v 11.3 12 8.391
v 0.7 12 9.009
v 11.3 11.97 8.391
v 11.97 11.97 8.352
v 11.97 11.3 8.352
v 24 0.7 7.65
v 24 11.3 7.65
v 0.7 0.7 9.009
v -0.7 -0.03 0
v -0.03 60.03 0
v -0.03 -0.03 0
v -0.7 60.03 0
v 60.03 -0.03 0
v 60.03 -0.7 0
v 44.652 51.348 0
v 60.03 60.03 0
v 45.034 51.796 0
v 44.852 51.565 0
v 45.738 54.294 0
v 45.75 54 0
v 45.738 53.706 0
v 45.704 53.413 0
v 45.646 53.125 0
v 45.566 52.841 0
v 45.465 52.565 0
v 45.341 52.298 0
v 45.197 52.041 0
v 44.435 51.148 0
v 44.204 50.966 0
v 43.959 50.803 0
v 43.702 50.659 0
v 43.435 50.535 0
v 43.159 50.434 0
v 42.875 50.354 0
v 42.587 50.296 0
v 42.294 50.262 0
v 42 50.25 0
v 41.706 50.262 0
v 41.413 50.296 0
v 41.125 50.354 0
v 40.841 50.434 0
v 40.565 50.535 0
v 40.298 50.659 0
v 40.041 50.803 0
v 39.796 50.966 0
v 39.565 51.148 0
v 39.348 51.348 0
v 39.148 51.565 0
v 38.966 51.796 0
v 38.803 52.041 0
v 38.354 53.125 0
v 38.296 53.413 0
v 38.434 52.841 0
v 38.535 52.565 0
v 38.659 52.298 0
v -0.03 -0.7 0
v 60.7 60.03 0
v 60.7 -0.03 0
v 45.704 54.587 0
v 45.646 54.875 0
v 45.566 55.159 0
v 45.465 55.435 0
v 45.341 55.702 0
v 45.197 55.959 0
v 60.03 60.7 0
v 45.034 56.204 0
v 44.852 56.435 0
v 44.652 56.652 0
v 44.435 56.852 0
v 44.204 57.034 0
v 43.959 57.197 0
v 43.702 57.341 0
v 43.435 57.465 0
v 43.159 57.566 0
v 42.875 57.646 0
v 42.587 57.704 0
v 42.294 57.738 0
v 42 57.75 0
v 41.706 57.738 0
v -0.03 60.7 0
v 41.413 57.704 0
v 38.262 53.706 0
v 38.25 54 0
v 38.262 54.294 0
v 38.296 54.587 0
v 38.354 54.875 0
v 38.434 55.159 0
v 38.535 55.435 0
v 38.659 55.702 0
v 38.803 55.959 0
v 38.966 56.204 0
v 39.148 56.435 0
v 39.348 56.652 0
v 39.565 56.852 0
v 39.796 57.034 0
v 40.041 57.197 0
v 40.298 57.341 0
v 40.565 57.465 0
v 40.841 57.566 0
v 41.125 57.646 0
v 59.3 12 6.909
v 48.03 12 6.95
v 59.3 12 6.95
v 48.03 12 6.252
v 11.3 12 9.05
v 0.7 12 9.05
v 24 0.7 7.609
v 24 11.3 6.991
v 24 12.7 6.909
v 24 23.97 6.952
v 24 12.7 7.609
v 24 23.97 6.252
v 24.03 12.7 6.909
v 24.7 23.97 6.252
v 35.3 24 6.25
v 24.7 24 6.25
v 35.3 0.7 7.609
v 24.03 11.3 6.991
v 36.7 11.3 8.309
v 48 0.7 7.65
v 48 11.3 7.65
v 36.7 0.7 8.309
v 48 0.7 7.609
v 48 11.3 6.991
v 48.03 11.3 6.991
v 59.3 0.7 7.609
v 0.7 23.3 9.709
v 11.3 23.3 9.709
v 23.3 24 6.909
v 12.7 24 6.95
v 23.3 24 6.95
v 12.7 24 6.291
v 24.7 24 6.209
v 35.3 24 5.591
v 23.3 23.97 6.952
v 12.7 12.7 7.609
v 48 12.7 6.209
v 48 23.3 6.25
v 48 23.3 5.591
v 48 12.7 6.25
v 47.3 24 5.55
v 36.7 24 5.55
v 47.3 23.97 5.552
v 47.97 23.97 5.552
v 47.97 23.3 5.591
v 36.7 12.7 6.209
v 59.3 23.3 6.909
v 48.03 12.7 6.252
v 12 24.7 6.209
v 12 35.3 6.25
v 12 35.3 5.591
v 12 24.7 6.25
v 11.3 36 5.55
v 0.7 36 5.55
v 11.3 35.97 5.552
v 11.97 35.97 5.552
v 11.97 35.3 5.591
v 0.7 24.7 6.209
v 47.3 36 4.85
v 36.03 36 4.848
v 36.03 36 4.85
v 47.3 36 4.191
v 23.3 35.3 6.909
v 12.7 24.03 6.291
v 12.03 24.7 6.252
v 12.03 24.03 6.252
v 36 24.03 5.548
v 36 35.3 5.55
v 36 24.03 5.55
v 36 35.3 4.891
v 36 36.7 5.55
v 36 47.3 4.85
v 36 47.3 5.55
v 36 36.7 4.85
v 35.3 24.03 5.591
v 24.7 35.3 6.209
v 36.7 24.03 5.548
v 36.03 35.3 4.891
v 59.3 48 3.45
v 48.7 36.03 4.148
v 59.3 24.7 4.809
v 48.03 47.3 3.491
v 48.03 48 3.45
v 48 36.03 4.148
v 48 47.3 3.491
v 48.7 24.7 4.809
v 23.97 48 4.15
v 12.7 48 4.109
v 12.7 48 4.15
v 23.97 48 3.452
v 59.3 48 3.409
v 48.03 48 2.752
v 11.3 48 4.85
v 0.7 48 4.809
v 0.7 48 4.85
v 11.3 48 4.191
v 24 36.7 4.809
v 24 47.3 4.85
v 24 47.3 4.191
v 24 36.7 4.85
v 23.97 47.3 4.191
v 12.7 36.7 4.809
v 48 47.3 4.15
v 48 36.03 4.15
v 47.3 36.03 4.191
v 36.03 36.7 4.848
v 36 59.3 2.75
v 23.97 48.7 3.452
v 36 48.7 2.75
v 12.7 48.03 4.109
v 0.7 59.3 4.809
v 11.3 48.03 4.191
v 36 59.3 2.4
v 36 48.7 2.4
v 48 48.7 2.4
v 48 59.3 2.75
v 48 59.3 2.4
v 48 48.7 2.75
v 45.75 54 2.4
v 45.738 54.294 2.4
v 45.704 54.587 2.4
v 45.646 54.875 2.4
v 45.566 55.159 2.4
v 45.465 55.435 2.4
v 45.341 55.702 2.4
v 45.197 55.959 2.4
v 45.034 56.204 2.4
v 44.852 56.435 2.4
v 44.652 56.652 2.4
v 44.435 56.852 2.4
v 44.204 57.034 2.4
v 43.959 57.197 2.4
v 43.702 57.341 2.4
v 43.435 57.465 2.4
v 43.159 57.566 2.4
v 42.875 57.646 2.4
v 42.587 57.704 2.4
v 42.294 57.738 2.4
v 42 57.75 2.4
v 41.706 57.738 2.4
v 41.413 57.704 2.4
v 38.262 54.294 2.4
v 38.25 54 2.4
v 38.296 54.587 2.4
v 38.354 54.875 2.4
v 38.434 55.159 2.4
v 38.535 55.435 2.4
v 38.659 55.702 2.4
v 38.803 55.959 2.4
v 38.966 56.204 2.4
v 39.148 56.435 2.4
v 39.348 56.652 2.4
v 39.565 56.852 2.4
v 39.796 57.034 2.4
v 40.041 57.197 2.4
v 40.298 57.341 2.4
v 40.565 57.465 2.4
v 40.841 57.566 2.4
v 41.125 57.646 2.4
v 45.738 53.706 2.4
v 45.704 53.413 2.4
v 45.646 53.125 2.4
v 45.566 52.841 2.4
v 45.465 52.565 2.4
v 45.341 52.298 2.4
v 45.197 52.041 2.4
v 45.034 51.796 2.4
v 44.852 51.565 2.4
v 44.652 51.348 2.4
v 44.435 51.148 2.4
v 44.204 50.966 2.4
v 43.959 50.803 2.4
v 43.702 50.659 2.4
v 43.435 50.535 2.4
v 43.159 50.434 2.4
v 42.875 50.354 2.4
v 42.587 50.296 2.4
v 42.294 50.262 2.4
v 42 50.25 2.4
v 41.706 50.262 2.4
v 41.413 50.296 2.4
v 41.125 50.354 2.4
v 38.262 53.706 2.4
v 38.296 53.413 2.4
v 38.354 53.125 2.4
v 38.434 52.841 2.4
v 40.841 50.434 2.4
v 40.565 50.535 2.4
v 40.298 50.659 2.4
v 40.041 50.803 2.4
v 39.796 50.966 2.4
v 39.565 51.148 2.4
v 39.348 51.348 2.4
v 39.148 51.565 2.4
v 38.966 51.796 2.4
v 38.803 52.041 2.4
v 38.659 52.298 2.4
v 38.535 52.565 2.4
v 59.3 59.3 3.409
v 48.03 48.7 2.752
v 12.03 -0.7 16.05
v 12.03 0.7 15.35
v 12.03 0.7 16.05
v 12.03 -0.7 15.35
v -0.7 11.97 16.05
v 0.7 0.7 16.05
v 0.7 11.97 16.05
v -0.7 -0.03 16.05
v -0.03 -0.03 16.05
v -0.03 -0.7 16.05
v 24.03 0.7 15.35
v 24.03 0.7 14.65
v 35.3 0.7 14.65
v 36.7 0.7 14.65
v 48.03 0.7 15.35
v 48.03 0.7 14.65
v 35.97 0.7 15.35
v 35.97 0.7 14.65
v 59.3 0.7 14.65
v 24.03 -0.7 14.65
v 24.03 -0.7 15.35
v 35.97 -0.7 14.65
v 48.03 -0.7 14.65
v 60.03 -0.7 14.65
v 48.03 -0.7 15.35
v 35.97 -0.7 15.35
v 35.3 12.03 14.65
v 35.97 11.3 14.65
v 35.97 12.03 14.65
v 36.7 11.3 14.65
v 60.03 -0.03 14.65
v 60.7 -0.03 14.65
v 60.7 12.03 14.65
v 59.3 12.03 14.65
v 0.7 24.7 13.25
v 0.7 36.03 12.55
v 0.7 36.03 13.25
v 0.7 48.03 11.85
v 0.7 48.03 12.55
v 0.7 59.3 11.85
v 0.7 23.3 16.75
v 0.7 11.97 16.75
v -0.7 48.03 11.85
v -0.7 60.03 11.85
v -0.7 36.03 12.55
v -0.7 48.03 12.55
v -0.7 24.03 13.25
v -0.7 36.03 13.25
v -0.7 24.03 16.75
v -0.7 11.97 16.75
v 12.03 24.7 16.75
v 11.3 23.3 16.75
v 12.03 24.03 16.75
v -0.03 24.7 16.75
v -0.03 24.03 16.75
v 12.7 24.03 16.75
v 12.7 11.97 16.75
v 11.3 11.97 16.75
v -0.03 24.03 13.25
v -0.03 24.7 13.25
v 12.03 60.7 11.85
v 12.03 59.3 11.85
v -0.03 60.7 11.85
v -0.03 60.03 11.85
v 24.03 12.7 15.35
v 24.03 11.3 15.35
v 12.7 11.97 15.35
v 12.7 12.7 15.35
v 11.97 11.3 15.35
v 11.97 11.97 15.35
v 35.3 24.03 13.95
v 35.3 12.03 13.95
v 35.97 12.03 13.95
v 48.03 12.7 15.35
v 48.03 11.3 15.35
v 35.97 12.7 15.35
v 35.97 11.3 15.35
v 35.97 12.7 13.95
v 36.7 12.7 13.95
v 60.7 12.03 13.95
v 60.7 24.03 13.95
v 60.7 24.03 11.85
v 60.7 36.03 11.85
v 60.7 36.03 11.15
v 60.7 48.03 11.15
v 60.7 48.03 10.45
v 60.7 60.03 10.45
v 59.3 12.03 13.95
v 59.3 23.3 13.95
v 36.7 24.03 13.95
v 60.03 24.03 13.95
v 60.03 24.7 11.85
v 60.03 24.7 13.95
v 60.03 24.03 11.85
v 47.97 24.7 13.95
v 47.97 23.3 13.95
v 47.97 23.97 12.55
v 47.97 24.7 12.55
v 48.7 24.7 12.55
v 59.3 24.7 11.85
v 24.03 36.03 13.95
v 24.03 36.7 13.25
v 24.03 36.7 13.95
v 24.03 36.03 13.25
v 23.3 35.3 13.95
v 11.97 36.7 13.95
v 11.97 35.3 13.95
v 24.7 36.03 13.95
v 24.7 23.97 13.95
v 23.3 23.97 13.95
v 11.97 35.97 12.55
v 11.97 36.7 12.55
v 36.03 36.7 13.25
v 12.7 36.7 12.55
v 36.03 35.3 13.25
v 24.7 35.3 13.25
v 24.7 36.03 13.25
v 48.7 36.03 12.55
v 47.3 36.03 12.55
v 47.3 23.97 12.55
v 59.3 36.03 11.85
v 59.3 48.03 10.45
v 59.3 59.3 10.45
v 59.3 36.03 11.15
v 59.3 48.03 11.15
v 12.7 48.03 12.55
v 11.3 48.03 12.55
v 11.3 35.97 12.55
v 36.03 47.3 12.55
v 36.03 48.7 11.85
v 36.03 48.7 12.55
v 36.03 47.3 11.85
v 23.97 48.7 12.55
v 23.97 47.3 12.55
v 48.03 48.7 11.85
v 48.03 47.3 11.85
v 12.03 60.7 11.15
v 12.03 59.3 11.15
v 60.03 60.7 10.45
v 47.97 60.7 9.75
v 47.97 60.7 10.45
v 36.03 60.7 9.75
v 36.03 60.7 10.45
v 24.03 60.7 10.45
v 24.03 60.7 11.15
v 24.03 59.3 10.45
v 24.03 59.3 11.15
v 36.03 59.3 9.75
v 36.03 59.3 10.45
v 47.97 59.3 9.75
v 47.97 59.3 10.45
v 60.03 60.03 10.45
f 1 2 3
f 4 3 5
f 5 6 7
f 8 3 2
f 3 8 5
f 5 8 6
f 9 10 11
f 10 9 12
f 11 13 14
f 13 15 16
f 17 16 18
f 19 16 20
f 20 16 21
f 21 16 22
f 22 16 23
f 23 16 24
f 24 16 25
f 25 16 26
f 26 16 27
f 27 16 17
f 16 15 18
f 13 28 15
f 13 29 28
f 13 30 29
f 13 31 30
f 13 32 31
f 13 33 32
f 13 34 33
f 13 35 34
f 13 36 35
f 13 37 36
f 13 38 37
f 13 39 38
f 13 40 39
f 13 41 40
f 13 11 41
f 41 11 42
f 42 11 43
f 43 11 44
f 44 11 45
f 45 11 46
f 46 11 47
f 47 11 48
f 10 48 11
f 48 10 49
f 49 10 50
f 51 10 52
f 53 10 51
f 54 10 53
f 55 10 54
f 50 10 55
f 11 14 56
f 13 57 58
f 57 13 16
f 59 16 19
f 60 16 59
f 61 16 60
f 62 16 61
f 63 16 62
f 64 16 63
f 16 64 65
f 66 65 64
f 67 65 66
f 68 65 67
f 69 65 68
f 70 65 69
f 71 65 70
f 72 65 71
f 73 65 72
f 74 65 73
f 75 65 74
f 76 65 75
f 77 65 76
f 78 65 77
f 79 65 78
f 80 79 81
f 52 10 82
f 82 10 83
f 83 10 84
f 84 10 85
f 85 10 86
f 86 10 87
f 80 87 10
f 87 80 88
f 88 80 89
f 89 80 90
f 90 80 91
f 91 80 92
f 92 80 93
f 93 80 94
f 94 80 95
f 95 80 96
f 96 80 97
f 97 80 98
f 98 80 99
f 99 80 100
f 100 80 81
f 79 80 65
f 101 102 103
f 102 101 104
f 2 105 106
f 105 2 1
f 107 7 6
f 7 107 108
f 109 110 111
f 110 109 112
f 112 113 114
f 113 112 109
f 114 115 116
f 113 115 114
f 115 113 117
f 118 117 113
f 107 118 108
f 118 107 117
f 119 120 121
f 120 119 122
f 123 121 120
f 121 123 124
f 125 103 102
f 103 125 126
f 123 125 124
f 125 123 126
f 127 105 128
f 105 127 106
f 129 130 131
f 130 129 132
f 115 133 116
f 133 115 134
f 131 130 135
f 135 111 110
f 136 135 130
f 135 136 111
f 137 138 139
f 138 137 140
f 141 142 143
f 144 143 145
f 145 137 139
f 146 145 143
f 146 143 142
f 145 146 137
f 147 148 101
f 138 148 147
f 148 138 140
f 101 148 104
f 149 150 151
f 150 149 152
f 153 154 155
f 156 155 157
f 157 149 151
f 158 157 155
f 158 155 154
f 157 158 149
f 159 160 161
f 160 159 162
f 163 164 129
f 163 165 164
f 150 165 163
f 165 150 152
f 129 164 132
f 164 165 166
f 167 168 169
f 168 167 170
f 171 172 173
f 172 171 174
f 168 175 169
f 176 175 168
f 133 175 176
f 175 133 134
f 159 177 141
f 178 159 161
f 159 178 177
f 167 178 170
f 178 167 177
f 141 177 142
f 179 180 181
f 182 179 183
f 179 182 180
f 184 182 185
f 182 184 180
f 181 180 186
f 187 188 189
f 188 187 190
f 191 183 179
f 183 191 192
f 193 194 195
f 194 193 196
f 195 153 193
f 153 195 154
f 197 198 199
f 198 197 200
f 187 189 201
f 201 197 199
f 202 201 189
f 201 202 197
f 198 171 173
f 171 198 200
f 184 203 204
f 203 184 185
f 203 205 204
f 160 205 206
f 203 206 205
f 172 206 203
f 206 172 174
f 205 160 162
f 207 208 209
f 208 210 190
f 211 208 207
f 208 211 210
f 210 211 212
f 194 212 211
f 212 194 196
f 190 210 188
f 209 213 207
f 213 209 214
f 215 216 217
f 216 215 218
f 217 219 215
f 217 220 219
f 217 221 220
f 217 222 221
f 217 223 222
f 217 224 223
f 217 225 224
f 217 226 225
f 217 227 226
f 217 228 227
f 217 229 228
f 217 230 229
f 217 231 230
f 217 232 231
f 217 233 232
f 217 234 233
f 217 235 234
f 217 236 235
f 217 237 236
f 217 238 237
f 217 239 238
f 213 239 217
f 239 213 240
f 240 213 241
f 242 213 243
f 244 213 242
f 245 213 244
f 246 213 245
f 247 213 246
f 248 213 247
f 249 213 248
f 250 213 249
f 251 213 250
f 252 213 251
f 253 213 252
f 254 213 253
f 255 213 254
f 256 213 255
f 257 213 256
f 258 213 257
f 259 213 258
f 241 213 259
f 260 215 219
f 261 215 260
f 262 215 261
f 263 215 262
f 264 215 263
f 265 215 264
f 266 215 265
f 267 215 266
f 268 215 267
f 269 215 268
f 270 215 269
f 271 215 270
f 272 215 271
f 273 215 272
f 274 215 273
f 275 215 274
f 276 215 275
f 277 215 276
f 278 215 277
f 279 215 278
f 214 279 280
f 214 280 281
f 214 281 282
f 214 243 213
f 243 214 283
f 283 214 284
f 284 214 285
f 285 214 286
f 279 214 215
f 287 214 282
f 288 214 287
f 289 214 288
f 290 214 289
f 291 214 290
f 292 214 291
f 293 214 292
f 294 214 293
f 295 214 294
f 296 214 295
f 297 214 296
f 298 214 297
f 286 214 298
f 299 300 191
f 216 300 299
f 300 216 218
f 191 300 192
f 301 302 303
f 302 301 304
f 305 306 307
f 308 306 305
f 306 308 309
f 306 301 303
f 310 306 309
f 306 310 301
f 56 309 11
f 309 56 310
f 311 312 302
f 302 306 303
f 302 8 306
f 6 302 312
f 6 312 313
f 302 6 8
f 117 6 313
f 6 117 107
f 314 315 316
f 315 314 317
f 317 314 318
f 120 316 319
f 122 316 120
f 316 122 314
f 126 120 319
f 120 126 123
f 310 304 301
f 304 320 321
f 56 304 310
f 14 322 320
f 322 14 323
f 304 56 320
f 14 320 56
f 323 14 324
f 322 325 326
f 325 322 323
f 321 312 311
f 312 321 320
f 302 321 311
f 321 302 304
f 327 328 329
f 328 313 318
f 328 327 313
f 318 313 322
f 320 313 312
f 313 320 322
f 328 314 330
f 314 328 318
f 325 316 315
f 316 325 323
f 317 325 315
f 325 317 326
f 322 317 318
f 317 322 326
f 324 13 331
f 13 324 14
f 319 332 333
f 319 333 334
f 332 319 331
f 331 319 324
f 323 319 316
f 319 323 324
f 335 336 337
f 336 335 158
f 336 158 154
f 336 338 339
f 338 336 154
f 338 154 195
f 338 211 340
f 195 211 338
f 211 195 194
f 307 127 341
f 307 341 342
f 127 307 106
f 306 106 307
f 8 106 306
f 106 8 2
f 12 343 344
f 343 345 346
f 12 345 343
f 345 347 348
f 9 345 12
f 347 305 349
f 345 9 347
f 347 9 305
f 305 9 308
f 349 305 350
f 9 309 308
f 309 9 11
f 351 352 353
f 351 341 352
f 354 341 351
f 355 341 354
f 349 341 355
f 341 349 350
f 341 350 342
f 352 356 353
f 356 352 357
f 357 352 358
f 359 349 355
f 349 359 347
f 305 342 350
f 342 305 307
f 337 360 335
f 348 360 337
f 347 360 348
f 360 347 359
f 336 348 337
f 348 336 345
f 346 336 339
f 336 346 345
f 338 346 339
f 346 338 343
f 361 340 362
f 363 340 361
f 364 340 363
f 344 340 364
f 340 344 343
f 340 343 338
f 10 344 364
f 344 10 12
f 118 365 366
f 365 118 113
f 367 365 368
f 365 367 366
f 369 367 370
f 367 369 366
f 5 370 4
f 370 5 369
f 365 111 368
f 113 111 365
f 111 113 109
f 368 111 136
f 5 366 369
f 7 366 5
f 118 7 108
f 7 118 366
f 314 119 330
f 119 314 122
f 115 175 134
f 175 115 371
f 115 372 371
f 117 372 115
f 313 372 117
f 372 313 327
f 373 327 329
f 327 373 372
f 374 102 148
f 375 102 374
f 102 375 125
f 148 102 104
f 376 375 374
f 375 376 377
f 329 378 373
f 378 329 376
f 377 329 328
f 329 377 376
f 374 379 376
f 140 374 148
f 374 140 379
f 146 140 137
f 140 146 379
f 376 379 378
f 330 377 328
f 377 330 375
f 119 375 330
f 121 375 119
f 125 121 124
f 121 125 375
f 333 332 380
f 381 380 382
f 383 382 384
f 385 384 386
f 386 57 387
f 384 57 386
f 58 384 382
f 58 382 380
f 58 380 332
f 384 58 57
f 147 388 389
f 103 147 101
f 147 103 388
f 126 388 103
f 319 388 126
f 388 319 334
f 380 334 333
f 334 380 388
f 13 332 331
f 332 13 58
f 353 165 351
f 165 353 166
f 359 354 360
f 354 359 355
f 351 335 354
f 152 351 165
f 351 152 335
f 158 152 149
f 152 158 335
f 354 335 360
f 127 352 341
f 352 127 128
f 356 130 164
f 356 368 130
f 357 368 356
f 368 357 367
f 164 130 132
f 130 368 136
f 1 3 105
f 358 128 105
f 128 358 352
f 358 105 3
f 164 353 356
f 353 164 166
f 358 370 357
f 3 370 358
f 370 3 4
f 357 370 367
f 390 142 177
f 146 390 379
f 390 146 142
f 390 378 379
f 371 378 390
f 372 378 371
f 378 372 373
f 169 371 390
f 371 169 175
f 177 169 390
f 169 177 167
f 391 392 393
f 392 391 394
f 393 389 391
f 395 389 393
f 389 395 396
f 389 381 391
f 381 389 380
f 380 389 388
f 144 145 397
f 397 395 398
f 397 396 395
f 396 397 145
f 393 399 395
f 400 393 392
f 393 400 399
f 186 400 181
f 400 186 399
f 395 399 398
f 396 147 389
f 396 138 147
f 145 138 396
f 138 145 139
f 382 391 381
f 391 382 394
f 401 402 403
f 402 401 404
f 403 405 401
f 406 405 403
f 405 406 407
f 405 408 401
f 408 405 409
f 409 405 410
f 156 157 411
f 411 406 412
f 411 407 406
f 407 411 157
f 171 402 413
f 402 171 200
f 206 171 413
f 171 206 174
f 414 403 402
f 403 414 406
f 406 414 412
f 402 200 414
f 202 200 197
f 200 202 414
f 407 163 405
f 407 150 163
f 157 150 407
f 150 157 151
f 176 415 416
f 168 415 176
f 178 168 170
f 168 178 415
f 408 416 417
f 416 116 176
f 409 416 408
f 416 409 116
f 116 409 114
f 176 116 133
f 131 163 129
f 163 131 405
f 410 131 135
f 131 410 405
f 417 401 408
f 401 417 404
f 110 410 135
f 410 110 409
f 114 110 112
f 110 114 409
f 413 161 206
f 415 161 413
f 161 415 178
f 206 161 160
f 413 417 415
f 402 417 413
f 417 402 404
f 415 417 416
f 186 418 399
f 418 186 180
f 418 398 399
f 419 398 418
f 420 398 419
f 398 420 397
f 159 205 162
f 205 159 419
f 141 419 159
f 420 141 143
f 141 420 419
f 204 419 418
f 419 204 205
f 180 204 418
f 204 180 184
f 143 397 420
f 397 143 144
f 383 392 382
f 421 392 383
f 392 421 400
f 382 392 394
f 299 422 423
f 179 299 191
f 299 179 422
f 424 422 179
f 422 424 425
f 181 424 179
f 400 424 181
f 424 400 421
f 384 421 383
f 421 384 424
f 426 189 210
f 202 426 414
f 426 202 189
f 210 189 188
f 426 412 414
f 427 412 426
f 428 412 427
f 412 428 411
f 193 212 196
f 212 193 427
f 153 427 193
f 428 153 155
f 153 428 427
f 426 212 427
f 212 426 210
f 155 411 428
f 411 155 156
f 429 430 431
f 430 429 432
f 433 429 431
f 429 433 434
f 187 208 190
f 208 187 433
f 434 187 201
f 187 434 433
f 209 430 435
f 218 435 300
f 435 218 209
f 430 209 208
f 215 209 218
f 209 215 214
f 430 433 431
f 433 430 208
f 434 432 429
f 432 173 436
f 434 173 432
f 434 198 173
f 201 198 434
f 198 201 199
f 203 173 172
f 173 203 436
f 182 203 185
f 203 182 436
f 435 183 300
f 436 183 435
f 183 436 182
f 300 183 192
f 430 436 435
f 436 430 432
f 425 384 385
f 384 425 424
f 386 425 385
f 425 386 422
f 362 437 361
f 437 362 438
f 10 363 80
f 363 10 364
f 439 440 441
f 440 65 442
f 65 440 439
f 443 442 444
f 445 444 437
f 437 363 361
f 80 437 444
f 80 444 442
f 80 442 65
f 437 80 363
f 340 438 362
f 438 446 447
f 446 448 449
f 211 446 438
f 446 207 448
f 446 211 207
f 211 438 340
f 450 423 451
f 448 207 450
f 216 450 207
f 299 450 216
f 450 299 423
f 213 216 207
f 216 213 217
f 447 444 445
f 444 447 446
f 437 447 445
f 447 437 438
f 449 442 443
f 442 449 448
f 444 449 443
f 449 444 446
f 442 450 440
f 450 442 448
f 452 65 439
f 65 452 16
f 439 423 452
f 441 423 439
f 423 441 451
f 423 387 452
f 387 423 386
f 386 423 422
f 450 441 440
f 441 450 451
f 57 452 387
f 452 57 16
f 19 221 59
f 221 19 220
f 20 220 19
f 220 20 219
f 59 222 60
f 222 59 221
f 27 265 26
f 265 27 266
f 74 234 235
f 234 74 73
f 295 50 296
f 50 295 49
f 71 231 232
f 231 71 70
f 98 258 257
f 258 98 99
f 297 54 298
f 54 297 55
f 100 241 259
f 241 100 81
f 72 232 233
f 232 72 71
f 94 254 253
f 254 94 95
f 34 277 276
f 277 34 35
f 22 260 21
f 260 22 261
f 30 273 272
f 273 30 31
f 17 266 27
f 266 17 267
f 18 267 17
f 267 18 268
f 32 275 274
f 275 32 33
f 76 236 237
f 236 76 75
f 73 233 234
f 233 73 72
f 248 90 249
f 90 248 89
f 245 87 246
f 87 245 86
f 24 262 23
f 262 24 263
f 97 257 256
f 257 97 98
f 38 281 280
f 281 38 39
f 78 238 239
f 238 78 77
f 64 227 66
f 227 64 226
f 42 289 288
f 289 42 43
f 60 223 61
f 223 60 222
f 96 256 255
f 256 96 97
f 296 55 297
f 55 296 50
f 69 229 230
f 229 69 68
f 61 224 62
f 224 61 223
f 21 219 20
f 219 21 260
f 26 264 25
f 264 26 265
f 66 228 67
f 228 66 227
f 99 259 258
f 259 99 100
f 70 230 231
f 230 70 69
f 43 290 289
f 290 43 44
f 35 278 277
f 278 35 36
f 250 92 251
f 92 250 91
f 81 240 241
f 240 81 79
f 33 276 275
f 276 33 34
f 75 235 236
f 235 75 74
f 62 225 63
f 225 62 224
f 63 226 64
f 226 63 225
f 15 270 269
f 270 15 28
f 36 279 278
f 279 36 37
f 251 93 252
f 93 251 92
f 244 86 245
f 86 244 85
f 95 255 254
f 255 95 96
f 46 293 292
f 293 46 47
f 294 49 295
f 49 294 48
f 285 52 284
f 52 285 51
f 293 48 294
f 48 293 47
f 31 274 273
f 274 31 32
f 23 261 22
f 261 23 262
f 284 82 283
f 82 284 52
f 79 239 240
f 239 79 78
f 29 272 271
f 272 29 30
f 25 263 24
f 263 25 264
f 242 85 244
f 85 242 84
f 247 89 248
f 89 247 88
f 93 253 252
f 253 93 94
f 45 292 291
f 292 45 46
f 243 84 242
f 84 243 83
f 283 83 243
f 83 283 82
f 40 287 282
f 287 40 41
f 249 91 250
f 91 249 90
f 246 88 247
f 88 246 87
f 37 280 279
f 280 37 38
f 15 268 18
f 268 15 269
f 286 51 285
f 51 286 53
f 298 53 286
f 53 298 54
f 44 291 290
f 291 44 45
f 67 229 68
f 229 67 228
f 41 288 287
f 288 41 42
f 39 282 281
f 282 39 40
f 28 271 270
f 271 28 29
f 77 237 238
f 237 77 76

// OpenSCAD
// ============================================================
// 4x6 Labyrinth Maze
// Simple Flat Ramp Per Cell
// Corrected polyhedron face order
// ============================================================


// ------------------------------------------------------------
// Input data
// ------------------------------------------------------------



rows = 5;
cols = 5;
target_row = 4;
target_col = 3;

cell_size = 12.0;
wall_thickness = 1.4;
wall_height = 7.0;
ball_diameter = 6.35;
target_hole_diameter = 7.5;

walls_south = [
   [ 0, 1, 0, 1, 0 ],
   [ 1, 0, 0, 0, 1 ],
   [ 0, 1, 1, 0, 0 ],
   [ 0, 0, 1, 1, 0 ],
   [ 1, 1, 1, 1, 1 ]
];

walls_east = [
   [ 0, 0, 1, 0, 1 ],
   [ 1, 0, 1, 0, 1 ],
   [ 0, 1, 0, 1, 1 ],
   [ 1, 0, 0, 0, 1 ],
   [ 0, 0, 0, 0, 1 ]
];

distance_map = [
   [ 9, 8, 7, 8, 7 ],
   [ 10, 7, 6, 5, 6 ],
   [ 5, 6, 5, 4, 3 ],
   [ 4, 3, 4, 3, 2 ],
   [ 3, 2, 1, 0, 1 ]
];

height_map = [
   [ 7.500, 6.800, 6.100, 6.800, 6.100 ],
   [ 8.200, 6.100, 5.400, 4.700, 5.400 ],
   [ 4.700, 5.400, 4.700, 4.000, 3.300 ],
   [ 4.000, 3.300, 4.000, 3.300, 2.600 ],
   [ 3.300, 2.600, 1.900, 1.200, 1.900 ]
];

flow_direction = [
   [ "E", "E", "S", "E", "S" ],
   [ "N", "S", "S", "S", "W" ],
   [ "S", "W", "E", "S", "S" ],
   [ "S", "S", "W", "E", "S" ],
   [ "E", "E", "E", "T", "W" ]
];




// ------------------------------------------------------------
// Model settings
// ------------------------------------------------------------

$fn = 80;

bottom_thickness = 1.2;
eps = 0.03;

// For testing flat cells, set this to 0.
// For real slope, use 0.40 or 0.50.
slope_strength = 0.35;

// Keep zero. Overlap causes intersection artifacts.
floor_overlap = 0;

show_direction_colors = true;


// ------------------------------------------------------------
// Helper functions
// ------------------------------------------------------------

function x_pos(c) = c * cell_size;
function y_pos(r) = r * cell_size;

// For testing all cells same flat height, use:
// function h(r, c) = 1.2;

// For real maze height map, use:
function h(r, c) = height_map[r][c];

function dir(r, c) = flow_direction[r][c];

function dir_color(d) =
    d == "N" ? "lightskyblue" :
    d == "S" ? "lightgreen" :
    d == "E" ? "orange" :
    d == "W" ? "violet" :
    d == "T" ? "red" :
    "lightgray";


// ------------------------------------------------------------
// Direction-based flat ramp
// ------------------------------------------------------------

/*
Corner order:

ch[0] = northwest
ch[1] = northeast
ch[2] = southwest
ch[3] = southeast
*/

function corner_heights_by_flow(r, c) =
    let(
        center_h = h(r, c),
        high_h = center_h + slope_strength,
        low_h  = center_h - slope_strength,
        d = dir(r, c)
    )

    d == "E" ? [
        high_h, low_h,
        high_h, low_h
    ] :

    d == "W" ? [
        low_h, high_h,
        low_h, high_h
    ] :

    d == "S" ? [
        high_h, high_h,
        low_h, low_h
    ] :

    d == "N" ? [
        low_h, low_h,
        high_h, high_h
    ] :

    [
        center_h, center_h,
        center_h, center_h
    ];


// ------------------------------------------------------------
// One sloped floor cell
// ------------------------------------------------------------

module floor_tile(r, c) {
    x = x_pos(c);
    y = y_pos(r);

    ch = corner_heights_by_flow(r, c);

    color(show_direction_colors ? dir_color(dir(r,c)) : "lightgray")
    polyhedron(
        points = [
            // bottom points
            [x,             y,             0], // 0 NW bottom
            [x + cell_size, y,             0], // 1 NE bottom
            [x,             y + cell_size, 0], // 2 SW bottom
            [x + cell_size, y + cell_size, 0], // 3 SE bottom

            // top points
            [x,             y,             bottom_thickness + ch[0]], // 4 NW top
            [x + cell_size, y,             bottom_thickness + ch[1]], // 5 NE top
            [x,             y + cell_size, bottom_thickness + ch[2]], // 6 SW top
            [x + cell_size, y + cell_size, bottom_thickness + ch[3]]  // 7 SE top
        ],

        faces = [
            // bottom face
            [0, 1, 3, 2],

            // top face, correct order around rectangle
            [4, 6, 7, 5],

            // side faces
            [0, 4, 5, 1], // north side
            [1, 5, 7, 3], // east side
            [3, 7, 6, 2], // south side
            [2, 6, 4, 0]  // west side
        ]
    );
}


module all_floor_tiles() {
    for (r = [0 : rows - 1]) {
        for (c = [0 : cols - 1]) {
            floor_tile(r, c);
        }
    }
}


// ------------------------------------------------------------
// Walls
// ------------------------------------------------------------

module south_wall(r, c) {
    x = x_pos(c);
    y = y_pos(r + 1) - wall_thickness / 2;

    translate([x - eps, y, 0])
    cube([
        cell_size + 2 * eps,
        wall_thickness,
        wall_height + bottom_thickness + h(r,c) + slope_strength
    ]);
}


module east_wall(r, c) {
    x = x_pos(c + 1) - wall_thickness / 2;
    y = y_pos(r);

    translate([x, y - eps, 0])
    cube([
        wall_thickness,
        cell_size + 2 * eps,
        wall_height + bottom_thickness + h(r,c) + slope_strength
    ]);
}


module north_boundary_wall(c) {
    x = x_pos(c);
    y = -wall_thickness / 2;

    translate([x - eps, y, 0])
    cube([
        cell_size + 2 * eps,
        wall_thickness,
        wall_height + bottom_thickness + h(0,c) + slope_strength
    ]);
}


module west_boundary_wall(r) {
    x = -wall_thickness / 2;
    y = y_pos(r);

    translate([x, y - eps, 0])
    cube([
        wall_thickness,
        cell_size + 2 * eps,
        wall_height + bottom_thickness + h(r,0) + slope_strength
    ]);
}


module all_walls() {
    color("dimgray") {
        // implicit north boundary
        for (c = [0 : cols - 1]) {
            north_boundary_wall(c);
        }

        // implicit west boundary
        for (r = [0 : rows - 1]) {
            west_boundary_wall(r);
        }

        // explicit south and east walls
        for (r = [0 : rows - 1]) {
            for (c = [0 : cols - 1]) {
                if (walls_south[r][c] == 1) {
                    south_wall(r, c);
                }

                if (walls_east[r][c] == 1) {
                    east_wall(r, c);
                }
            }
        }
    }
}


// ------------------------------------------------------------
// Target hole
// ------------------------------------------------------------

module target_hole_cut() {
    x = x_pos(target_col) + cell_size / 2;
    y = y_pos(target_row) + cell_size / 2;

    translate([x, y, -eps])
    cylinder(
        h = wall_height + bottom_thickness + 40,
        d = target_hole_diameter
    );
}


// ------------------------------------------------------------
// Complete labyrinth
// ------------------------------------------------------------

module labyrinth() {
    difference() {
        union() {
            all_floor_tiles();
            all_walls();
        }

        target_hole_cut();
    }
}


// ------------------------------------------------------------
// Render
// ------------------------------------------------------------

labyrinth();
